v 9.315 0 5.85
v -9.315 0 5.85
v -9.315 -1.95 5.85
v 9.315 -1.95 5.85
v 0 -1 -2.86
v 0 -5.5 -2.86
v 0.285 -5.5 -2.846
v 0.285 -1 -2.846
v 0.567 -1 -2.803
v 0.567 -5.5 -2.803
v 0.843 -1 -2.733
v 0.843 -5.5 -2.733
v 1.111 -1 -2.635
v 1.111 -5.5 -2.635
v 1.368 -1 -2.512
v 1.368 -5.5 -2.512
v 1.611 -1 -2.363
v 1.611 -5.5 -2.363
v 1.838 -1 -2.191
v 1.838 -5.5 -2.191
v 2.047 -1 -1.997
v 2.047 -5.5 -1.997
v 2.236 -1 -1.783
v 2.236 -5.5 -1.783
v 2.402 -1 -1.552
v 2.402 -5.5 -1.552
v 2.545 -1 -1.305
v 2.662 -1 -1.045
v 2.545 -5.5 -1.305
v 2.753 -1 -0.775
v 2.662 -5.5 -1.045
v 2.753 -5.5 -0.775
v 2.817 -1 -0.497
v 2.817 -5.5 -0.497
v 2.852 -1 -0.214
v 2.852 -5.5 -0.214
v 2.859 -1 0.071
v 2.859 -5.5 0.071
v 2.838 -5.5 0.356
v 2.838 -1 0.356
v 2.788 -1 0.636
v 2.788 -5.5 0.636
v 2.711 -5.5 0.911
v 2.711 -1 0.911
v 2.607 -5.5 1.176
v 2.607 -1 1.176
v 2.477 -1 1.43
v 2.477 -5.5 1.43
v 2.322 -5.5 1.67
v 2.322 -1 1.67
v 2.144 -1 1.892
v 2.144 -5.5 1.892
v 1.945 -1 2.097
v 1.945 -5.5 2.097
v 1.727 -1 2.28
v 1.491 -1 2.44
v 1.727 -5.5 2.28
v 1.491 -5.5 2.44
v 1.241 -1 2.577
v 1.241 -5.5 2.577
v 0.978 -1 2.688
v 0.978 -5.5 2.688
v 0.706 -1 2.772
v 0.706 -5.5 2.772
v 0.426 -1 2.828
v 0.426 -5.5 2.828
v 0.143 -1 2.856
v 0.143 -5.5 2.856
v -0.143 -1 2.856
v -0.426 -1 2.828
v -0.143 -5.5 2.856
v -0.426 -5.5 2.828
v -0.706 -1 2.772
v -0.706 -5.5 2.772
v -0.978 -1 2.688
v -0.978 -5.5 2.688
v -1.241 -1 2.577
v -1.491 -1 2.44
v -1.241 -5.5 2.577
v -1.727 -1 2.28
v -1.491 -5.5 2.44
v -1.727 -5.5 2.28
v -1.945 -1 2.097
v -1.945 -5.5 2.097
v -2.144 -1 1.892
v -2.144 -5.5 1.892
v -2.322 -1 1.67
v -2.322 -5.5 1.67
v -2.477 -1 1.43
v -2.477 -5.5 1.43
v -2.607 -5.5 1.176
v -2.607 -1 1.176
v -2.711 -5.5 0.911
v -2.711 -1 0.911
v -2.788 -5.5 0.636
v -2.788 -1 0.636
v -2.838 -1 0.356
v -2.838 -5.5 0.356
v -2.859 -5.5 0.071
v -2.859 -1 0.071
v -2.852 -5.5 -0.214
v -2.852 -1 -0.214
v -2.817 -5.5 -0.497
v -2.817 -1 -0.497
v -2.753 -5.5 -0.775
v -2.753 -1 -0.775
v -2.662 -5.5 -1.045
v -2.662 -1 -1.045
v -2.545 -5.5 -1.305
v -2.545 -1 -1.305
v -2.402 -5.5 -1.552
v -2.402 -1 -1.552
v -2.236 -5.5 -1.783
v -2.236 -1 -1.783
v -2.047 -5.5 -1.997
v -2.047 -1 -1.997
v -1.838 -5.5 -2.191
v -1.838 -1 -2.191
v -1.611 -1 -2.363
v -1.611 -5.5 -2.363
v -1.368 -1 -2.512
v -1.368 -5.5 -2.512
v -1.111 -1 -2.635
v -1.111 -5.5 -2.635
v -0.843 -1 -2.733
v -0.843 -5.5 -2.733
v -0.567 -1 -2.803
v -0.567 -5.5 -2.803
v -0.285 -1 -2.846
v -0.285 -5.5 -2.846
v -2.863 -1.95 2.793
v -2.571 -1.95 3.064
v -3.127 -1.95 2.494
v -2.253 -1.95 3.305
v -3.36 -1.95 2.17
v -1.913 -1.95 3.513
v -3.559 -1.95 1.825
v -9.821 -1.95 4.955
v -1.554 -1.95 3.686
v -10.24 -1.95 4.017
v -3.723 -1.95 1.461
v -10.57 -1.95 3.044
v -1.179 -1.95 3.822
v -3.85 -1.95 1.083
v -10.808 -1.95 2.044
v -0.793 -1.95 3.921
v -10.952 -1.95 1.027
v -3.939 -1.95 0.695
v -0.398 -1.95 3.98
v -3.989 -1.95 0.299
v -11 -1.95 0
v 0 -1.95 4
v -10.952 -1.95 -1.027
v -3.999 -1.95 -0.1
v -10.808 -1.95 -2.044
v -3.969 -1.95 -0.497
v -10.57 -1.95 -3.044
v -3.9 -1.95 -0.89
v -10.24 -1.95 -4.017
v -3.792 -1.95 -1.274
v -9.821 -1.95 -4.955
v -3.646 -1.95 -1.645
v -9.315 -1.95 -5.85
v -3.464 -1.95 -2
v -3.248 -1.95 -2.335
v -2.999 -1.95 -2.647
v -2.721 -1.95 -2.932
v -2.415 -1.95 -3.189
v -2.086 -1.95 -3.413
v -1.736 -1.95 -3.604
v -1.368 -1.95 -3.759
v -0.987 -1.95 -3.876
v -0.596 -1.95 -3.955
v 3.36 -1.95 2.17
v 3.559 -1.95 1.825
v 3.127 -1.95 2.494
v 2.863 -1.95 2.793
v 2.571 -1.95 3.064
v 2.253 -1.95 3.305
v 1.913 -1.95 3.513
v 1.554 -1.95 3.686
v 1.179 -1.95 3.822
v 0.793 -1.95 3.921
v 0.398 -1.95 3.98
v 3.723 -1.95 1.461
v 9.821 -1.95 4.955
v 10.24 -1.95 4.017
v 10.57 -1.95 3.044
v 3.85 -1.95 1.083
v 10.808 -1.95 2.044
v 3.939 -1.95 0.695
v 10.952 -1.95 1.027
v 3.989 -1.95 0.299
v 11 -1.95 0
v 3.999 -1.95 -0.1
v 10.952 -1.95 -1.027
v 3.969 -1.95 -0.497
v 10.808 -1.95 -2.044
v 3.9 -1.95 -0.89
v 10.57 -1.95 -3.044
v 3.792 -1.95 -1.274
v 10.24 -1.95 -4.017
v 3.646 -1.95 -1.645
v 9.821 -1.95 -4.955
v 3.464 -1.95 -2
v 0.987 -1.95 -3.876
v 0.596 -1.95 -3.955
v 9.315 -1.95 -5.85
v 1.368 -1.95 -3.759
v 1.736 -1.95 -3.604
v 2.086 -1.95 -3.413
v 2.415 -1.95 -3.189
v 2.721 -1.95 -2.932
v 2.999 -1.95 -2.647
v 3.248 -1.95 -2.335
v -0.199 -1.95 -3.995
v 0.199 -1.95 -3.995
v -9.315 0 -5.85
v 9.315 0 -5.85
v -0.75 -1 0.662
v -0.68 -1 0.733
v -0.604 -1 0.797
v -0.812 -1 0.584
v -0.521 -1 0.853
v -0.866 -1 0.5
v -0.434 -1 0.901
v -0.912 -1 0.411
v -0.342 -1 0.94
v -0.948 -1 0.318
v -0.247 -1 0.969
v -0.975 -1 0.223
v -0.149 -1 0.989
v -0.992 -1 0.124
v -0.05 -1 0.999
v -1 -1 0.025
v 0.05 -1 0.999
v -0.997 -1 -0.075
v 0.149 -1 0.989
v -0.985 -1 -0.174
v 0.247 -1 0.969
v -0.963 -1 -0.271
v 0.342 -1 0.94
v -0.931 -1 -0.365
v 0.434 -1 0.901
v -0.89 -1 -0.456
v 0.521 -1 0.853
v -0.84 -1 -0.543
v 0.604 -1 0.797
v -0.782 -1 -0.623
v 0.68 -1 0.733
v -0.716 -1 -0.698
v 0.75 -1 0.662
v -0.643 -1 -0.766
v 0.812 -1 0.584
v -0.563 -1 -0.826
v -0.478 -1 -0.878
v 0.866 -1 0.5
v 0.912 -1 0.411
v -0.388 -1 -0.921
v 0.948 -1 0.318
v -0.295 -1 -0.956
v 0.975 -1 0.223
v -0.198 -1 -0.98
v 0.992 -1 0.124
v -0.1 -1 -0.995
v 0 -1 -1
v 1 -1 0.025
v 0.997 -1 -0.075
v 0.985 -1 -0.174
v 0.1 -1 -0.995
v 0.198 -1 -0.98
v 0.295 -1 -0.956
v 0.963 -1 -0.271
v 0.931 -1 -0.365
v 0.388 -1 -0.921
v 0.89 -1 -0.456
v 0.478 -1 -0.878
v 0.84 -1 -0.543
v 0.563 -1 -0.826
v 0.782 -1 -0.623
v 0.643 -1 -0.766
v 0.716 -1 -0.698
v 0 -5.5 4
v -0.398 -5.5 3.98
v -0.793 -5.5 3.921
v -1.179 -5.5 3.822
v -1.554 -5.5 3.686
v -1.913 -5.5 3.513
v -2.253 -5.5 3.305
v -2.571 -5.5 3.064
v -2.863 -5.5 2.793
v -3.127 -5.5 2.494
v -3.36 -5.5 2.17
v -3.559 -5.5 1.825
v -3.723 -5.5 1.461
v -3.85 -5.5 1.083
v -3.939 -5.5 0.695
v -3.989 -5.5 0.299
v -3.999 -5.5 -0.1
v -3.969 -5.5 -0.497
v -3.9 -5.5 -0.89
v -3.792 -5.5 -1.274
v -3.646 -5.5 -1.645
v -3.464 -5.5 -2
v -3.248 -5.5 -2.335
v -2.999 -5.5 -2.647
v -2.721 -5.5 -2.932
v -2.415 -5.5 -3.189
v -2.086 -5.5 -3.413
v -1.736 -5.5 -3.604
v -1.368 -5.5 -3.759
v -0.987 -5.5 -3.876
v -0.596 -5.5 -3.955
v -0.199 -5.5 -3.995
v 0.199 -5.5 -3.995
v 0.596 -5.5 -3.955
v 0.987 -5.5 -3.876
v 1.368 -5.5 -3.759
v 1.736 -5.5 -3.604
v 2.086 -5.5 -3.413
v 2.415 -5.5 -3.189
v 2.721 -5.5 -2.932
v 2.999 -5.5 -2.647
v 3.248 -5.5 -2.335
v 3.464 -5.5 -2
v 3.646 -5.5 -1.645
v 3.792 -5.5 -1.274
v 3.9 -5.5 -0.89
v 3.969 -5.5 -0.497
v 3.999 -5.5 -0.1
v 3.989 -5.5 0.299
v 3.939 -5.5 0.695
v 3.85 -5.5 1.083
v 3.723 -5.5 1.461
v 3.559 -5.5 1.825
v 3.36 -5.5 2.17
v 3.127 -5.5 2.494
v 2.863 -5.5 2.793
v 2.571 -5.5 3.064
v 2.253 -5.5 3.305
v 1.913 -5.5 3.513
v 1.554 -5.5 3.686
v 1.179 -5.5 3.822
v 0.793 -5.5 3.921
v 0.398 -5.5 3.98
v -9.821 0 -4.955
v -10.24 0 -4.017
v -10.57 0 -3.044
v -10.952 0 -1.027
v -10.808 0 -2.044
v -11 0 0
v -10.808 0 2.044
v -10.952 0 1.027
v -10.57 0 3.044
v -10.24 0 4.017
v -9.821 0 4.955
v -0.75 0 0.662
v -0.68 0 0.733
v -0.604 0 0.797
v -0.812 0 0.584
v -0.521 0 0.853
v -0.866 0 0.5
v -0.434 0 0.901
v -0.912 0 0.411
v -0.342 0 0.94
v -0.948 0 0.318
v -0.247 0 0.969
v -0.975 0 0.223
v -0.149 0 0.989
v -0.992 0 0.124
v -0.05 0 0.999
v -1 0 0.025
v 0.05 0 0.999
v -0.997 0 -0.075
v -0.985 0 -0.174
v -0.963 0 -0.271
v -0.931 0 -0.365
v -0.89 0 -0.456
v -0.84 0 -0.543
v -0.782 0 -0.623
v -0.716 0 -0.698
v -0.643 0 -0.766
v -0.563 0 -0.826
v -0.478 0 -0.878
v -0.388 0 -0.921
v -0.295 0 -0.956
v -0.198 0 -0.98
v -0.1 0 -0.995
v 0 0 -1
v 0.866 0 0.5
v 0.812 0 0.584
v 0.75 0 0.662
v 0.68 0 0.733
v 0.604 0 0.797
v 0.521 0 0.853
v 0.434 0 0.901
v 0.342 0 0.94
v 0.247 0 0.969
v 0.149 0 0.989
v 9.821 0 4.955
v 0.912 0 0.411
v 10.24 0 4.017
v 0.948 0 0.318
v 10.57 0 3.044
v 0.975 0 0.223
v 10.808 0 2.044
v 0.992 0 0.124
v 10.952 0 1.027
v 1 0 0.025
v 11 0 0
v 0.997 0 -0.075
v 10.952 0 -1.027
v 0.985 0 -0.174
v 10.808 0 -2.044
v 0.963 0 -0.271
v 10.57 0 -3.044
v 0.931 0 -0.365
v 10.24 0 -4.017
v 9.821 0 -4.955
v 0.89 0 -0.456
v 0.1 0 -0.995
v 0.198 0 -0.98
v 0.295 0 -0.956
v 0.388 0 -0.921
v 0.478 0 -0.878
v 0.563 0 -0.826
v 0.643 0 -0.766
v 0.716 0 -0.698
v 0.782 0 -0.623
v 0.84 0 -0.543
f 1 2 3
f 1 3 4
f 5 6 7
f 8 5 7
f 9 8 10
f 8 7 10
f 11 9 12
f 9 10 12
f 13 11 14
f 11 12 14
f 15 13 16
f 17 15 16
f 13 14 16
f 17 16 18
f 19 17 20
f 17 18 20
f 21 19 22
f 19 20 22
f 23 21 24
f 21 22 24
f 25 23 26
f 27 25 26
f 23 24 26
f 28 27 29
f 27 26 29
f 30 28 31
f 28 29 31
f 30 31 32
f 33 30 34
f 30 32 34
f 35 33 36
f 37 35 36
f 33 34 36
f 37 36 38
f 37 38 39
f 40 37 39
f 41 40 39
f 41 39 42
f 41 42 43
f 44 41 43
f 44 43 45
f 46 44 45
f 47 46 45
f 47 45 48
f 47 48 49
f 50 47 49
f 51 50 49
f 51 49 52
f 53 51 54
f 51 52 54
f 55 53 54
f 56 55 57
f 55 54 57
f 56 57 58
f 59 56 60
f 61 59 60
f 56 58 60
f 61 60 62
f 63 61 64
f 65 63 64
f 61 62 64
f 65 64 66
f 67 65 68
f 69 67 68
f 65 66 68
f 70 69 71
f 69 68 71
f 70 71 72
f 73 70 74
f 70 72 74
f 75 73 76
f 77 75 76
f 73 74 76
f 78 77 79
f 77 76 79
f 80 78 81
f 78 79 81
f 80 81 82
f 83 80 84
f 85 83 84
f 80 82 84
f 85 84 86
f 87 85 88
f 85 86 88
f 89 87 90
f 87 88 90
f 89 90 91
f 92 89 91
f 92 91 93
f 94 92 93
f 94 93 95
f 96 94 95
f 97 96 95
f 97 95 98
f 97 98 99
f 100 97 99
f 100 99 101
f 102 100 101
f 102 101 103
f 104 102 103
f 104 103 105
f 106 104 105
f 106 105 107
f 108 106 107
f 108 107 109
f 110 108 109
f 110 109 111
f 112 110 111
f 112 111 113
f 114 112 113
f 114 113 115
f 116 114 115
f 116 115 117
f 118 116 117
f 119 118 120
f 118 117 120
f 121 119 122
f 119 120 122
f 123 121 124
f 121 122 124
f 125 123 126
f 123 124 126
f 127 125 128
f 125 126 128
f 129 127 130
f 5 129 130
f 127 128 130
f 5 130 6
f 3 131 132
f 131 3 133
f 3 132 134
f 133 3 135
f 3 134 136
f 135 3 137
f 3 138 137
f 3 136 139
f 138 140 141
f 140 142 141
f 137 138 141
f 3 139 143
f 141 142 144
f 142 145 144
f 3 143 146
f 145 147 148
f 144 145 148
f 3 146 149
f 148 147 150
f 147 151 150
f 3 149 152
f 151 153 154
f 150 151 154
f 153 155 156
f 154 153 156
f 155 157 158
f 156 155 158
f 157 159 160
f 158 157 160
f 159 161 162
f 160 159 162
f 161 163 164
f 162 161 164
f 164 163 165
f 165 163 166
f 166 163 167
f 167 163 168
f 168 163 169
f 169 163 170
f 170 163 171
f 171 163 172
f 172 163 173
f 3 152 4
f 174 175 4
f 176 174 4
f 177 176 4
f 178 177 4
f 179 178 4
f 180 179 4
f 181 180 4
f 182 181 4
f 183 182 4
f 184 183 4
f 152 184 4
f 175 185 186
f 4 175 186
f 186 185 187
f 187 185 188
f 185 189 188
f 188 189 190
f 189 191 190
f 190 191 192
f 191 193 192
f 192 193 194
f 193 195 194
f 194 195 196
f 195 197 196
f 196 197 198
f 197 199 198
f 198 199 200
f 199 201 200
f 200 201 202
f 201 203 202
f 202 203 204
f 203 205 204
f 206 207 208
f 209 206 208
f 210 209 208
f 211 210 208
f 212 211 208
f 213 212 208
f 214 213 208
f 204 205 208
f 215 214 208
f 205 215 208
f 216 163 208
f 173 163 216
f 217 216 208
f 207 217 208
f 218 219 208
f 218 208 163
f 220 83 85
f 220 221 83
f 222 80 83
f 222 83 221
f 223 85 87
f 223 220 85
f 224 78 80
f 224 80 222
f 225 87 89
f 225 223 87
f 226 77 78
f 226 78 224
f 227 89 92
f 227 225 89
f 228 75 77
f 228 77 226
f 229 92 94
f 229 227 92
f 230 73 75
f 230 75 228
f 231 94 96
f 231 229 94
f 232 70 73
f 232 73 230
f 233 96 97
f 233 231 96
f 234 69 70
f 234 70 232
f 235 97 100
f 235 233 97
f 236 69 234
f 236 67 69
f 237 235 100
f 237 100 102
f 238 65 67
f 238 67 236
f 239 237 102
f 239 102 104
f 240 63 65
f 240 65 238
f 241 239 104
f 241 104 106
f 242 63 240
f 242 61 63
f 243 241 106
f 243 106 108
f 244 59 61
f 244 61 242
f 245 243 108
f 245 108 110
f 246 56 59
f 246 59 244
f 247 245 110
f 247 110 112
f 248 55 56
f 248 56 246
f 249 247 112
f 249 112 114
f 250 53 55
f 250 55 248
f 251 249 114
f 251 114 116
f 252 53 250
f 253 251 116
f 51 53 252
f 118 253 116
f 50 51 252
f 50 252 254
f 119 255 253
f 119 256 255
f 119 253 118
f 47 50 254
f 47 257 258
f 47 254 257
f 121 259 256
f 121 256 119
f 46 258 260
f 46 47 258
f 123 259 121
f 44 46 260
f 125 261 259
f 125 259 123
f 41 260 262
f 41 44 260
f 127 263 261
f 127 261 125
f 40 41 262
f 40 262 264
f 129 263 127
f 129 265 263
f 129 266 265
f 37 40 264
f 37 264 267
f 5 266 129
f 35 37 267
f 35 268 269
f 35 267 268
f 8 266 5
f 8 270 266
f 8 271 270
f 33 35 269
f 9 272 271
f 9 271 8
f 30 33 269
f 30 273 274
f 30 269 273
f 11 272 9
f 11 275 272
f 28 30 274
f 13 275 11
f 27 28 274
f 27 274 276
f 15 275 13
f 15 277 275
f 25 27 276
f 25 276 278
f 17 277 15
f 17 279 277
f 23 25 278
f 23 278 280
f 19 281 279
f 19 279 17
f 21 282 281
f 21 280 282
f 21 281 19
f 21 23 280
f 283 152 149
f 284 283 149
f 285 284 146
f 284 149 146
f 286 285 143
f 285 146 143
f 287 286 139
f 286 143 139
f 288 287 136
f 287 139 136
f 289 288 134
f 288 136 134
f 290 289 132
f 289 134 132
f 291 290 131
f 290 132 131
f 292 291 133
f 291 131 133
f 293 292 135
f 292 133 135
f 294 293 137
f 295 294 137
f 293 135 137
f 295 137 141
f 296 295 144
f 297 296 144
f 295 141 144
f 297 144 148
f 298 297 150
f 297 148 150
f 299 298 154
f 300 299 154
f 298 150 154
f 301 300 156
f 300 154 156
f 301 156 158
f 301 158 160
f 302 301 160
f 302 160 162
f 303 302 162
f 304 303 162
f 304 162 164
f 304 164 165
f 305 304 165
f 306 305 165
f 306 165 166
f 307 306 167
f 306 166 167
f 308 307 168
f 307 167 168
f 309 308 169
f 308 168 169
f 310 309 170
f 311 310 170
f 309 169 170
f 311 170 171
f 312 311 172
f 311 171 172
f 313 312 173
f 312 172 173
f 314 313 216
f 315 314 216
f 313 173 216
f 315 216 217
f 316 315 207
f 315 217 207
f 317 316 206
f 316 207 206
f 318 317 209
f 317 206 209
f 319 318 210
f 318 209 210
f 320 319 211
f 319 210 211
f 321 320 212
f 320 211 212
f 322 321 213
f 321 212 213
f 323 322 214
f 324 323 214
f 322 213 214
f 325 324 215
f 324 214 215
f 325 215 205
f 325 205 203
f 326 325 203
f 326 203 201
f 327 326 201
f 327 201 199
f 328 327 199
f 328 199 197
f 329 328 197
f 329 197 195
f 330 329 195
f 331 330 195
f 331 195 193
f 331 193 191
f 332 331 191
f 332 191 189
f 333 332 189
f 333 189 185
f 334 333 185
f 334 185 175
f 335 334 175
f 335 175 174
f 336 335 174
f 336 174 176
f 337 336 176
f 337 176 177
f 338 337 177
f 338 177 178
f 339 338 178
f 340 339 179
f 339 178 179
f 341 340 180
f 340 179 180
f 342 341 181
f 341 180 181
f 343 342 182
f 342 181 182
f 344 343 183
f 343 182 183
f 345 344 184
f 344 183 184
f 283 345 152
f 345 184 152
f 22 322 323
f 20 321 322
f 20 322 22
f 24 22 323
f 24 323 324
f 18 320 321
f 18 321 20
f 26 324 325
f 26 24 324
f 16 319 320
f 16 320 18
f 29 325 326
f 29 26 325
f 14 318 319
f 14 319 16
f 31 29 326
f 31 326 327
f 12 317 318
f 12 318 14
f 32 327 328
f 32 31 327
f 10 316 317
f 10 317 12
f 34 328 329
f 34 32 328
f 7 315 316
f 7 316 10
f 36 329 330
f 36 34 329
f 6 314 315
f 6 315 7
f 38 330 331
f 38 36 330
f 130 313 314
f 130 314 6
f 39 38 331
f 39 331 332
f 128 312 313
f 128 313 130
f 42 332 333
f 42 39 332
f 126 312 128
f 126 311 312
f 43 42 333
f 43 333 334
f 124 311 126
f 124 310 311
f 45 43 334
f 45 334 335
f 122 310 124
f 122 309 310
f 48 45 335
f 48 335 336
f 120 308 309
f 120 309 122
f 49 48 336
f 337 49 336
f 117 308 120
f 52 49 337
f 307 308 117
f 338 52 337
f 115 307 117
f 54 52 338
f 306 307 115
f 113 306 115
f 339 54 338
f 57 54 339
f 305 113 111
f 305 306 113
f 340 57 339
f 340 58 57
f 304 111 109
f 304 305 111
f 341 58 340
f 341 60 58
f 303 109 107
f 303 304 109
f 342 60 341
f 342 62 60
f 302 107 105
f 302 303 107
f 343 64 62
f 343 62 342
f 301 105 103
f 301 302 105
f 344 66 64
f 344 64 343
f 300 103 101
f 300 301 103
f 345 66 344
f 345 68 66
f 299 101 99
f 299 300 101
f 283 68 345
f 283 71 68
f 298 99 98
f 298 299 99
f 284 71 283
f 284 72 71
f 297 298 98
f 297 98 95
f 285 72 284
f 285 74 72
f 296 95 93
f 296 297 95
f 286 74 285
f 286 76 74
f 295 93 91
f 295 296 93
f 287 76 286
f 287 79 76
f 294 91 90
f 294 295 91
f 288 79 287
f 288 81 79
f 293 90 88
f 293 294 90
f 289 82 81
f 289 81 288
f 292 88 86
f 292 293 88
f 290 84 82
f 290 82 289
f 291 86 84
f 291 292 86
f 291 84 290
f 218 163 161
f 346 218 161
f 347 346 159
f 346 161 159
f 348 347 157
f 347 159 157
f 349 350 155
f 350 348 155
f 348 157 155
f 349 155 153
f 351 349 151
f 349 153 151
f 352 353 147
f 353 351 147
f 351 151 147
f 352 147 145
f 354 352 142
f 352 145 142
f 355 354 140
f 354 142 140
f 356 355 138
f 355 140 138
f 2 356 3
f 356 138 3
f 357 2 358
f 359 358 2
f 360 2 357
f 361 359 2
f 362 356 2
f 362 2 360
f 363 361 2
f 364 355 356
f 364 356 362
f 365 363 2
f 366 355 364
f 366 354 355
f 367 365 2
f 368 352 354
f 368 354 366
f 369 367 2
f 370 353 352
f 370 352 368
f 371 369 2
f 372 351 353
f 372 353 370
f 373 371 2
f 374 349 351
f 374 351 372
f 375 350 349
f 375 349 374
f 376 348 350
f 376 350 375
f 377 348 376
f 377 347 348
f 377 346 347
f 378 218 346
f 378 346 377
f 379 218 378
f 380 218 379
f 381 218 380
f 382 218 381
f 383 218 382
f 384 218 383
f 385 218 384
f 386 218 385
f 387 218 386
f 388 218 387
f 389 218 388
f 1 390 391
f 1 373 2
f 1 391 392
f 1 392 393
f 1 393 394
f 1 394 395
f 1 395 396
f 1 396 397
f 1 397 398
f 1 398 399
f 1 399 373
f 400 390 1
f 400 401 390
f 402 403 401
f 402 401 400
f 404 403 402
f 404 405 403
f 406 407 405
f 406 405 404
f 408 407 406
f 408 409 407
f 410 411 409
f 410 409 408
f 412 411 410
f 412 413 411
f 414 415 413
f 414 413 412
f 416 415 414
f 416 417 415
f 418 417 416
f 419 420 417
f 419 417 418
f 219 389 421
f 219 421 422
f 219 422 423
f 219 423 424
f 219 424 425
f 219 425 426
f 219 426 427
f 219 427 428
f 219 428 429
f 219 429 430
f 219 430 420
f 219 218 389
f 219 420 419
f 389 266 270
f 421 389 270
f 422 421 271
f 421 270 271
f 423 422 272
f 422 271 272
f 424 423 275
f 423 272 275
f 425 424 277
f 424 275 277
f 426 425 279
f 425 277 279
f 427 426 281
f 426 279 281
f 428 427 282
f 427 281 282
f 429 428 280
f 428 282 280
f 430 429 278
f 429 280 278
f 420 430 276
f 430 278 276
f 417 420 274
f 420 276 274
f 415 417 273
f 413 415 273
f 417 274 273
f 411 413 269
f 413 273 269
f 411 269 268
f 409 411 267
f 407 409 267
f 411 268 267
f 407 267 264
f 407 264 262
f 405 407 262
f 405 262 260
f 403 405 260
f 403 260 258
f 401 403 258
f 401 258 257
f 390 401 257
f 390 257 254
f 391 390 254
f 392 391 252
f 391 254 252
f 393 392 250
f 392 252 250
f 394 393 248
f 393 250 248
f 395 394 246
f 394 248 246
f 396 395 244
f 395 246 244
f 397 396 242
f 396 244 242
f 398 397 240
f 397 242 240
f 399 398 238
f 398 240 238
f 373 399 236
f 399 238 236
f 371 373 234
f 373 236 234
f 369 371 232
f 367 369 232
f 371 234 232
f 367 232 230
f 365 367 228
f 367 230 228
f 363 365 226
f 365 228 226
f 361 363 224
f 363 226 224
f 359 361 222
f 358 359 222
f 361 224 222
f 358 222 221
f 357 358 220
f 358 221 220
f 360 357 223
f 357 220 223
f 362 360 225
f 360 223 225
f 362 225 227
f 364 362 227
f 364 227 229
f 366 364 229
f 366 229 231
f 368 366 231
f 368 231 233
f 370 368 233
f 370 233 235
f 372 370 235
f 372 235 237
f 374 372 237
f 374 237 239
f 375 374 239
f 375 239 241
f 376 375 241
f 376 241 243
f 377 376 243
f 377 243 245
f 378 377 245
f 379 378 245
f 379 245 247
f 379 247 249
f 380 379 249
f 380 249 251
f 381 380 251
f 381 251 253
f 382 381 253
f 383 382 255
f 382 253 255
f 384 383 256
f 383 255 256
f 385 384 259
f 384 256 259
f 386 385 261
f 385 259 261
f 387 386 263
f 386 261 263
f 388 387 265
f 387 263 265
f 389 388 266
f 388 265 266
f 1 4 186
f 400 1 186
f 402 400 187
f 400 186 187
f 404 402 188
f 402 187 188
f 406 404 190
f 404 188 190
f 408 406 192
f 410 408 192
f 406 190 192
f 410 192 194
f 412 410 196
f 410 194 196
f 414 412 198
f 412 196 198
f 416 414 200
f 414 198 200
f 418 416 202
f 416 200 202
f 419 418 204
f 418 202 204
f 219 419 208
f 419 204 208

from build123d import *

# Parameters (mm, degrees)
BOSS_EXTRUDE1_DEPTH     = 1.95
SKETCH2_R               = 4
BOSS_EXTRUDE2_DEPTH     = 3.55
SKETCH3_R               = 2.86
CUT_EXTRUDE1_DEPTH      = 4.5
SKETCH4_R               = 1
CUT_EXTRUDE2_DEPTH      = 1
CUT_EXTRUDE3_DEPTH      = 25.219723368
CUT_EXTRUDE3_DEPTH_BACK = 25.219723368
SKETCH5_OUTSIDE_W       = 57.198
SKETCH5_OUTSIDE_H       = 23.198
SKETCH5_OUTSIDE_R       = 11


with BuildPart() as part:
    # Sketch1 → Boss-Extrude1 (new body)
    with BuildSketch(Plane(origin=(0, 0, 0), x_dir=(1, 0, 0), z_dir=(0, 1, 0))):
        with BuildLine():
            Line((17, 5.85), (-17, 5.85))
            ThreePointArc((-17, 5.85), (-21.13657467, 4.13657467), (-22.85, 0))
            ThreePointArc((-22.85, 0), (-21.13657467, -4.13657467), (-17, -5.85))
            Line((-17, -5.85), (17, -5.85))
            ThreePointArc((17, -5.85), (21.13657467, -4.13657467), (22.85, 0))
            ThreePointArc((22.85, 0), (21.13657467, 4.13657467), (17, 5.85))
        make_face()
    extrude(amount=-BOSS_EXTRUDE1_DEPTH)

    # Sketch2 → Boss-Extrude2 (add)
    with BuildSketch(Plane.XZ.offset(1.95)):
        with Locations(Location((0, 0, 0), (0, 0, 90))):
            Circle(SKETCH2_R)
    extrude(amount=BOSS_EXTRUDE2_DEPTH)

    # Sketch3 → Cut-Extrude1 (cut)
    with BuildSketch(Plane.XZ.offset(5.5)):
        with Locations(Location((0, 0, 0), (0, 0, 270))):
            Circle(SKETCH3_R)
    extrude(amount=-CUT_EXTRUDE1_DEPTH, mode=Mode.SUBTRACT)

    # Sketch4 → Cut-Extrude2 (cut)
    with BuildSketch(Plane.XZ.offset(1)):
        with Locations(Location((0, 0, 0), (0, 0, 270))):
            Circle(SKETCH4_R)
    extrude(amount=-CUT_EXTRUDE2_DEPTH, mode=Mode.SUBTRACT)

    # Sketch5 outside → Cut-Extrude3 (cut, two sides: drawn at the far end of the back side and taken through both)
    with BuildSketch(Plane(origin=(0, 0, 0), x_dir=(1, 0, 0), z_dir=(0, 1, 0)).offset(-CUT_EXTRUDE3_DEPTH_BACK)):
        Rectangle(SKETCH5_OUTSIDE_W, SKETCH5_OUTSIDE_H)
        Circle(SKETCH5_OUTSIDE_R, mode=Mode.SUBTRACT)
    extrude(amount=CUT_EXTRUDE3_DEPTH + CUT_EXTRUDE3_DEPTH_BACK, mode=Mode.SUBTRACT)


solid = part.part
